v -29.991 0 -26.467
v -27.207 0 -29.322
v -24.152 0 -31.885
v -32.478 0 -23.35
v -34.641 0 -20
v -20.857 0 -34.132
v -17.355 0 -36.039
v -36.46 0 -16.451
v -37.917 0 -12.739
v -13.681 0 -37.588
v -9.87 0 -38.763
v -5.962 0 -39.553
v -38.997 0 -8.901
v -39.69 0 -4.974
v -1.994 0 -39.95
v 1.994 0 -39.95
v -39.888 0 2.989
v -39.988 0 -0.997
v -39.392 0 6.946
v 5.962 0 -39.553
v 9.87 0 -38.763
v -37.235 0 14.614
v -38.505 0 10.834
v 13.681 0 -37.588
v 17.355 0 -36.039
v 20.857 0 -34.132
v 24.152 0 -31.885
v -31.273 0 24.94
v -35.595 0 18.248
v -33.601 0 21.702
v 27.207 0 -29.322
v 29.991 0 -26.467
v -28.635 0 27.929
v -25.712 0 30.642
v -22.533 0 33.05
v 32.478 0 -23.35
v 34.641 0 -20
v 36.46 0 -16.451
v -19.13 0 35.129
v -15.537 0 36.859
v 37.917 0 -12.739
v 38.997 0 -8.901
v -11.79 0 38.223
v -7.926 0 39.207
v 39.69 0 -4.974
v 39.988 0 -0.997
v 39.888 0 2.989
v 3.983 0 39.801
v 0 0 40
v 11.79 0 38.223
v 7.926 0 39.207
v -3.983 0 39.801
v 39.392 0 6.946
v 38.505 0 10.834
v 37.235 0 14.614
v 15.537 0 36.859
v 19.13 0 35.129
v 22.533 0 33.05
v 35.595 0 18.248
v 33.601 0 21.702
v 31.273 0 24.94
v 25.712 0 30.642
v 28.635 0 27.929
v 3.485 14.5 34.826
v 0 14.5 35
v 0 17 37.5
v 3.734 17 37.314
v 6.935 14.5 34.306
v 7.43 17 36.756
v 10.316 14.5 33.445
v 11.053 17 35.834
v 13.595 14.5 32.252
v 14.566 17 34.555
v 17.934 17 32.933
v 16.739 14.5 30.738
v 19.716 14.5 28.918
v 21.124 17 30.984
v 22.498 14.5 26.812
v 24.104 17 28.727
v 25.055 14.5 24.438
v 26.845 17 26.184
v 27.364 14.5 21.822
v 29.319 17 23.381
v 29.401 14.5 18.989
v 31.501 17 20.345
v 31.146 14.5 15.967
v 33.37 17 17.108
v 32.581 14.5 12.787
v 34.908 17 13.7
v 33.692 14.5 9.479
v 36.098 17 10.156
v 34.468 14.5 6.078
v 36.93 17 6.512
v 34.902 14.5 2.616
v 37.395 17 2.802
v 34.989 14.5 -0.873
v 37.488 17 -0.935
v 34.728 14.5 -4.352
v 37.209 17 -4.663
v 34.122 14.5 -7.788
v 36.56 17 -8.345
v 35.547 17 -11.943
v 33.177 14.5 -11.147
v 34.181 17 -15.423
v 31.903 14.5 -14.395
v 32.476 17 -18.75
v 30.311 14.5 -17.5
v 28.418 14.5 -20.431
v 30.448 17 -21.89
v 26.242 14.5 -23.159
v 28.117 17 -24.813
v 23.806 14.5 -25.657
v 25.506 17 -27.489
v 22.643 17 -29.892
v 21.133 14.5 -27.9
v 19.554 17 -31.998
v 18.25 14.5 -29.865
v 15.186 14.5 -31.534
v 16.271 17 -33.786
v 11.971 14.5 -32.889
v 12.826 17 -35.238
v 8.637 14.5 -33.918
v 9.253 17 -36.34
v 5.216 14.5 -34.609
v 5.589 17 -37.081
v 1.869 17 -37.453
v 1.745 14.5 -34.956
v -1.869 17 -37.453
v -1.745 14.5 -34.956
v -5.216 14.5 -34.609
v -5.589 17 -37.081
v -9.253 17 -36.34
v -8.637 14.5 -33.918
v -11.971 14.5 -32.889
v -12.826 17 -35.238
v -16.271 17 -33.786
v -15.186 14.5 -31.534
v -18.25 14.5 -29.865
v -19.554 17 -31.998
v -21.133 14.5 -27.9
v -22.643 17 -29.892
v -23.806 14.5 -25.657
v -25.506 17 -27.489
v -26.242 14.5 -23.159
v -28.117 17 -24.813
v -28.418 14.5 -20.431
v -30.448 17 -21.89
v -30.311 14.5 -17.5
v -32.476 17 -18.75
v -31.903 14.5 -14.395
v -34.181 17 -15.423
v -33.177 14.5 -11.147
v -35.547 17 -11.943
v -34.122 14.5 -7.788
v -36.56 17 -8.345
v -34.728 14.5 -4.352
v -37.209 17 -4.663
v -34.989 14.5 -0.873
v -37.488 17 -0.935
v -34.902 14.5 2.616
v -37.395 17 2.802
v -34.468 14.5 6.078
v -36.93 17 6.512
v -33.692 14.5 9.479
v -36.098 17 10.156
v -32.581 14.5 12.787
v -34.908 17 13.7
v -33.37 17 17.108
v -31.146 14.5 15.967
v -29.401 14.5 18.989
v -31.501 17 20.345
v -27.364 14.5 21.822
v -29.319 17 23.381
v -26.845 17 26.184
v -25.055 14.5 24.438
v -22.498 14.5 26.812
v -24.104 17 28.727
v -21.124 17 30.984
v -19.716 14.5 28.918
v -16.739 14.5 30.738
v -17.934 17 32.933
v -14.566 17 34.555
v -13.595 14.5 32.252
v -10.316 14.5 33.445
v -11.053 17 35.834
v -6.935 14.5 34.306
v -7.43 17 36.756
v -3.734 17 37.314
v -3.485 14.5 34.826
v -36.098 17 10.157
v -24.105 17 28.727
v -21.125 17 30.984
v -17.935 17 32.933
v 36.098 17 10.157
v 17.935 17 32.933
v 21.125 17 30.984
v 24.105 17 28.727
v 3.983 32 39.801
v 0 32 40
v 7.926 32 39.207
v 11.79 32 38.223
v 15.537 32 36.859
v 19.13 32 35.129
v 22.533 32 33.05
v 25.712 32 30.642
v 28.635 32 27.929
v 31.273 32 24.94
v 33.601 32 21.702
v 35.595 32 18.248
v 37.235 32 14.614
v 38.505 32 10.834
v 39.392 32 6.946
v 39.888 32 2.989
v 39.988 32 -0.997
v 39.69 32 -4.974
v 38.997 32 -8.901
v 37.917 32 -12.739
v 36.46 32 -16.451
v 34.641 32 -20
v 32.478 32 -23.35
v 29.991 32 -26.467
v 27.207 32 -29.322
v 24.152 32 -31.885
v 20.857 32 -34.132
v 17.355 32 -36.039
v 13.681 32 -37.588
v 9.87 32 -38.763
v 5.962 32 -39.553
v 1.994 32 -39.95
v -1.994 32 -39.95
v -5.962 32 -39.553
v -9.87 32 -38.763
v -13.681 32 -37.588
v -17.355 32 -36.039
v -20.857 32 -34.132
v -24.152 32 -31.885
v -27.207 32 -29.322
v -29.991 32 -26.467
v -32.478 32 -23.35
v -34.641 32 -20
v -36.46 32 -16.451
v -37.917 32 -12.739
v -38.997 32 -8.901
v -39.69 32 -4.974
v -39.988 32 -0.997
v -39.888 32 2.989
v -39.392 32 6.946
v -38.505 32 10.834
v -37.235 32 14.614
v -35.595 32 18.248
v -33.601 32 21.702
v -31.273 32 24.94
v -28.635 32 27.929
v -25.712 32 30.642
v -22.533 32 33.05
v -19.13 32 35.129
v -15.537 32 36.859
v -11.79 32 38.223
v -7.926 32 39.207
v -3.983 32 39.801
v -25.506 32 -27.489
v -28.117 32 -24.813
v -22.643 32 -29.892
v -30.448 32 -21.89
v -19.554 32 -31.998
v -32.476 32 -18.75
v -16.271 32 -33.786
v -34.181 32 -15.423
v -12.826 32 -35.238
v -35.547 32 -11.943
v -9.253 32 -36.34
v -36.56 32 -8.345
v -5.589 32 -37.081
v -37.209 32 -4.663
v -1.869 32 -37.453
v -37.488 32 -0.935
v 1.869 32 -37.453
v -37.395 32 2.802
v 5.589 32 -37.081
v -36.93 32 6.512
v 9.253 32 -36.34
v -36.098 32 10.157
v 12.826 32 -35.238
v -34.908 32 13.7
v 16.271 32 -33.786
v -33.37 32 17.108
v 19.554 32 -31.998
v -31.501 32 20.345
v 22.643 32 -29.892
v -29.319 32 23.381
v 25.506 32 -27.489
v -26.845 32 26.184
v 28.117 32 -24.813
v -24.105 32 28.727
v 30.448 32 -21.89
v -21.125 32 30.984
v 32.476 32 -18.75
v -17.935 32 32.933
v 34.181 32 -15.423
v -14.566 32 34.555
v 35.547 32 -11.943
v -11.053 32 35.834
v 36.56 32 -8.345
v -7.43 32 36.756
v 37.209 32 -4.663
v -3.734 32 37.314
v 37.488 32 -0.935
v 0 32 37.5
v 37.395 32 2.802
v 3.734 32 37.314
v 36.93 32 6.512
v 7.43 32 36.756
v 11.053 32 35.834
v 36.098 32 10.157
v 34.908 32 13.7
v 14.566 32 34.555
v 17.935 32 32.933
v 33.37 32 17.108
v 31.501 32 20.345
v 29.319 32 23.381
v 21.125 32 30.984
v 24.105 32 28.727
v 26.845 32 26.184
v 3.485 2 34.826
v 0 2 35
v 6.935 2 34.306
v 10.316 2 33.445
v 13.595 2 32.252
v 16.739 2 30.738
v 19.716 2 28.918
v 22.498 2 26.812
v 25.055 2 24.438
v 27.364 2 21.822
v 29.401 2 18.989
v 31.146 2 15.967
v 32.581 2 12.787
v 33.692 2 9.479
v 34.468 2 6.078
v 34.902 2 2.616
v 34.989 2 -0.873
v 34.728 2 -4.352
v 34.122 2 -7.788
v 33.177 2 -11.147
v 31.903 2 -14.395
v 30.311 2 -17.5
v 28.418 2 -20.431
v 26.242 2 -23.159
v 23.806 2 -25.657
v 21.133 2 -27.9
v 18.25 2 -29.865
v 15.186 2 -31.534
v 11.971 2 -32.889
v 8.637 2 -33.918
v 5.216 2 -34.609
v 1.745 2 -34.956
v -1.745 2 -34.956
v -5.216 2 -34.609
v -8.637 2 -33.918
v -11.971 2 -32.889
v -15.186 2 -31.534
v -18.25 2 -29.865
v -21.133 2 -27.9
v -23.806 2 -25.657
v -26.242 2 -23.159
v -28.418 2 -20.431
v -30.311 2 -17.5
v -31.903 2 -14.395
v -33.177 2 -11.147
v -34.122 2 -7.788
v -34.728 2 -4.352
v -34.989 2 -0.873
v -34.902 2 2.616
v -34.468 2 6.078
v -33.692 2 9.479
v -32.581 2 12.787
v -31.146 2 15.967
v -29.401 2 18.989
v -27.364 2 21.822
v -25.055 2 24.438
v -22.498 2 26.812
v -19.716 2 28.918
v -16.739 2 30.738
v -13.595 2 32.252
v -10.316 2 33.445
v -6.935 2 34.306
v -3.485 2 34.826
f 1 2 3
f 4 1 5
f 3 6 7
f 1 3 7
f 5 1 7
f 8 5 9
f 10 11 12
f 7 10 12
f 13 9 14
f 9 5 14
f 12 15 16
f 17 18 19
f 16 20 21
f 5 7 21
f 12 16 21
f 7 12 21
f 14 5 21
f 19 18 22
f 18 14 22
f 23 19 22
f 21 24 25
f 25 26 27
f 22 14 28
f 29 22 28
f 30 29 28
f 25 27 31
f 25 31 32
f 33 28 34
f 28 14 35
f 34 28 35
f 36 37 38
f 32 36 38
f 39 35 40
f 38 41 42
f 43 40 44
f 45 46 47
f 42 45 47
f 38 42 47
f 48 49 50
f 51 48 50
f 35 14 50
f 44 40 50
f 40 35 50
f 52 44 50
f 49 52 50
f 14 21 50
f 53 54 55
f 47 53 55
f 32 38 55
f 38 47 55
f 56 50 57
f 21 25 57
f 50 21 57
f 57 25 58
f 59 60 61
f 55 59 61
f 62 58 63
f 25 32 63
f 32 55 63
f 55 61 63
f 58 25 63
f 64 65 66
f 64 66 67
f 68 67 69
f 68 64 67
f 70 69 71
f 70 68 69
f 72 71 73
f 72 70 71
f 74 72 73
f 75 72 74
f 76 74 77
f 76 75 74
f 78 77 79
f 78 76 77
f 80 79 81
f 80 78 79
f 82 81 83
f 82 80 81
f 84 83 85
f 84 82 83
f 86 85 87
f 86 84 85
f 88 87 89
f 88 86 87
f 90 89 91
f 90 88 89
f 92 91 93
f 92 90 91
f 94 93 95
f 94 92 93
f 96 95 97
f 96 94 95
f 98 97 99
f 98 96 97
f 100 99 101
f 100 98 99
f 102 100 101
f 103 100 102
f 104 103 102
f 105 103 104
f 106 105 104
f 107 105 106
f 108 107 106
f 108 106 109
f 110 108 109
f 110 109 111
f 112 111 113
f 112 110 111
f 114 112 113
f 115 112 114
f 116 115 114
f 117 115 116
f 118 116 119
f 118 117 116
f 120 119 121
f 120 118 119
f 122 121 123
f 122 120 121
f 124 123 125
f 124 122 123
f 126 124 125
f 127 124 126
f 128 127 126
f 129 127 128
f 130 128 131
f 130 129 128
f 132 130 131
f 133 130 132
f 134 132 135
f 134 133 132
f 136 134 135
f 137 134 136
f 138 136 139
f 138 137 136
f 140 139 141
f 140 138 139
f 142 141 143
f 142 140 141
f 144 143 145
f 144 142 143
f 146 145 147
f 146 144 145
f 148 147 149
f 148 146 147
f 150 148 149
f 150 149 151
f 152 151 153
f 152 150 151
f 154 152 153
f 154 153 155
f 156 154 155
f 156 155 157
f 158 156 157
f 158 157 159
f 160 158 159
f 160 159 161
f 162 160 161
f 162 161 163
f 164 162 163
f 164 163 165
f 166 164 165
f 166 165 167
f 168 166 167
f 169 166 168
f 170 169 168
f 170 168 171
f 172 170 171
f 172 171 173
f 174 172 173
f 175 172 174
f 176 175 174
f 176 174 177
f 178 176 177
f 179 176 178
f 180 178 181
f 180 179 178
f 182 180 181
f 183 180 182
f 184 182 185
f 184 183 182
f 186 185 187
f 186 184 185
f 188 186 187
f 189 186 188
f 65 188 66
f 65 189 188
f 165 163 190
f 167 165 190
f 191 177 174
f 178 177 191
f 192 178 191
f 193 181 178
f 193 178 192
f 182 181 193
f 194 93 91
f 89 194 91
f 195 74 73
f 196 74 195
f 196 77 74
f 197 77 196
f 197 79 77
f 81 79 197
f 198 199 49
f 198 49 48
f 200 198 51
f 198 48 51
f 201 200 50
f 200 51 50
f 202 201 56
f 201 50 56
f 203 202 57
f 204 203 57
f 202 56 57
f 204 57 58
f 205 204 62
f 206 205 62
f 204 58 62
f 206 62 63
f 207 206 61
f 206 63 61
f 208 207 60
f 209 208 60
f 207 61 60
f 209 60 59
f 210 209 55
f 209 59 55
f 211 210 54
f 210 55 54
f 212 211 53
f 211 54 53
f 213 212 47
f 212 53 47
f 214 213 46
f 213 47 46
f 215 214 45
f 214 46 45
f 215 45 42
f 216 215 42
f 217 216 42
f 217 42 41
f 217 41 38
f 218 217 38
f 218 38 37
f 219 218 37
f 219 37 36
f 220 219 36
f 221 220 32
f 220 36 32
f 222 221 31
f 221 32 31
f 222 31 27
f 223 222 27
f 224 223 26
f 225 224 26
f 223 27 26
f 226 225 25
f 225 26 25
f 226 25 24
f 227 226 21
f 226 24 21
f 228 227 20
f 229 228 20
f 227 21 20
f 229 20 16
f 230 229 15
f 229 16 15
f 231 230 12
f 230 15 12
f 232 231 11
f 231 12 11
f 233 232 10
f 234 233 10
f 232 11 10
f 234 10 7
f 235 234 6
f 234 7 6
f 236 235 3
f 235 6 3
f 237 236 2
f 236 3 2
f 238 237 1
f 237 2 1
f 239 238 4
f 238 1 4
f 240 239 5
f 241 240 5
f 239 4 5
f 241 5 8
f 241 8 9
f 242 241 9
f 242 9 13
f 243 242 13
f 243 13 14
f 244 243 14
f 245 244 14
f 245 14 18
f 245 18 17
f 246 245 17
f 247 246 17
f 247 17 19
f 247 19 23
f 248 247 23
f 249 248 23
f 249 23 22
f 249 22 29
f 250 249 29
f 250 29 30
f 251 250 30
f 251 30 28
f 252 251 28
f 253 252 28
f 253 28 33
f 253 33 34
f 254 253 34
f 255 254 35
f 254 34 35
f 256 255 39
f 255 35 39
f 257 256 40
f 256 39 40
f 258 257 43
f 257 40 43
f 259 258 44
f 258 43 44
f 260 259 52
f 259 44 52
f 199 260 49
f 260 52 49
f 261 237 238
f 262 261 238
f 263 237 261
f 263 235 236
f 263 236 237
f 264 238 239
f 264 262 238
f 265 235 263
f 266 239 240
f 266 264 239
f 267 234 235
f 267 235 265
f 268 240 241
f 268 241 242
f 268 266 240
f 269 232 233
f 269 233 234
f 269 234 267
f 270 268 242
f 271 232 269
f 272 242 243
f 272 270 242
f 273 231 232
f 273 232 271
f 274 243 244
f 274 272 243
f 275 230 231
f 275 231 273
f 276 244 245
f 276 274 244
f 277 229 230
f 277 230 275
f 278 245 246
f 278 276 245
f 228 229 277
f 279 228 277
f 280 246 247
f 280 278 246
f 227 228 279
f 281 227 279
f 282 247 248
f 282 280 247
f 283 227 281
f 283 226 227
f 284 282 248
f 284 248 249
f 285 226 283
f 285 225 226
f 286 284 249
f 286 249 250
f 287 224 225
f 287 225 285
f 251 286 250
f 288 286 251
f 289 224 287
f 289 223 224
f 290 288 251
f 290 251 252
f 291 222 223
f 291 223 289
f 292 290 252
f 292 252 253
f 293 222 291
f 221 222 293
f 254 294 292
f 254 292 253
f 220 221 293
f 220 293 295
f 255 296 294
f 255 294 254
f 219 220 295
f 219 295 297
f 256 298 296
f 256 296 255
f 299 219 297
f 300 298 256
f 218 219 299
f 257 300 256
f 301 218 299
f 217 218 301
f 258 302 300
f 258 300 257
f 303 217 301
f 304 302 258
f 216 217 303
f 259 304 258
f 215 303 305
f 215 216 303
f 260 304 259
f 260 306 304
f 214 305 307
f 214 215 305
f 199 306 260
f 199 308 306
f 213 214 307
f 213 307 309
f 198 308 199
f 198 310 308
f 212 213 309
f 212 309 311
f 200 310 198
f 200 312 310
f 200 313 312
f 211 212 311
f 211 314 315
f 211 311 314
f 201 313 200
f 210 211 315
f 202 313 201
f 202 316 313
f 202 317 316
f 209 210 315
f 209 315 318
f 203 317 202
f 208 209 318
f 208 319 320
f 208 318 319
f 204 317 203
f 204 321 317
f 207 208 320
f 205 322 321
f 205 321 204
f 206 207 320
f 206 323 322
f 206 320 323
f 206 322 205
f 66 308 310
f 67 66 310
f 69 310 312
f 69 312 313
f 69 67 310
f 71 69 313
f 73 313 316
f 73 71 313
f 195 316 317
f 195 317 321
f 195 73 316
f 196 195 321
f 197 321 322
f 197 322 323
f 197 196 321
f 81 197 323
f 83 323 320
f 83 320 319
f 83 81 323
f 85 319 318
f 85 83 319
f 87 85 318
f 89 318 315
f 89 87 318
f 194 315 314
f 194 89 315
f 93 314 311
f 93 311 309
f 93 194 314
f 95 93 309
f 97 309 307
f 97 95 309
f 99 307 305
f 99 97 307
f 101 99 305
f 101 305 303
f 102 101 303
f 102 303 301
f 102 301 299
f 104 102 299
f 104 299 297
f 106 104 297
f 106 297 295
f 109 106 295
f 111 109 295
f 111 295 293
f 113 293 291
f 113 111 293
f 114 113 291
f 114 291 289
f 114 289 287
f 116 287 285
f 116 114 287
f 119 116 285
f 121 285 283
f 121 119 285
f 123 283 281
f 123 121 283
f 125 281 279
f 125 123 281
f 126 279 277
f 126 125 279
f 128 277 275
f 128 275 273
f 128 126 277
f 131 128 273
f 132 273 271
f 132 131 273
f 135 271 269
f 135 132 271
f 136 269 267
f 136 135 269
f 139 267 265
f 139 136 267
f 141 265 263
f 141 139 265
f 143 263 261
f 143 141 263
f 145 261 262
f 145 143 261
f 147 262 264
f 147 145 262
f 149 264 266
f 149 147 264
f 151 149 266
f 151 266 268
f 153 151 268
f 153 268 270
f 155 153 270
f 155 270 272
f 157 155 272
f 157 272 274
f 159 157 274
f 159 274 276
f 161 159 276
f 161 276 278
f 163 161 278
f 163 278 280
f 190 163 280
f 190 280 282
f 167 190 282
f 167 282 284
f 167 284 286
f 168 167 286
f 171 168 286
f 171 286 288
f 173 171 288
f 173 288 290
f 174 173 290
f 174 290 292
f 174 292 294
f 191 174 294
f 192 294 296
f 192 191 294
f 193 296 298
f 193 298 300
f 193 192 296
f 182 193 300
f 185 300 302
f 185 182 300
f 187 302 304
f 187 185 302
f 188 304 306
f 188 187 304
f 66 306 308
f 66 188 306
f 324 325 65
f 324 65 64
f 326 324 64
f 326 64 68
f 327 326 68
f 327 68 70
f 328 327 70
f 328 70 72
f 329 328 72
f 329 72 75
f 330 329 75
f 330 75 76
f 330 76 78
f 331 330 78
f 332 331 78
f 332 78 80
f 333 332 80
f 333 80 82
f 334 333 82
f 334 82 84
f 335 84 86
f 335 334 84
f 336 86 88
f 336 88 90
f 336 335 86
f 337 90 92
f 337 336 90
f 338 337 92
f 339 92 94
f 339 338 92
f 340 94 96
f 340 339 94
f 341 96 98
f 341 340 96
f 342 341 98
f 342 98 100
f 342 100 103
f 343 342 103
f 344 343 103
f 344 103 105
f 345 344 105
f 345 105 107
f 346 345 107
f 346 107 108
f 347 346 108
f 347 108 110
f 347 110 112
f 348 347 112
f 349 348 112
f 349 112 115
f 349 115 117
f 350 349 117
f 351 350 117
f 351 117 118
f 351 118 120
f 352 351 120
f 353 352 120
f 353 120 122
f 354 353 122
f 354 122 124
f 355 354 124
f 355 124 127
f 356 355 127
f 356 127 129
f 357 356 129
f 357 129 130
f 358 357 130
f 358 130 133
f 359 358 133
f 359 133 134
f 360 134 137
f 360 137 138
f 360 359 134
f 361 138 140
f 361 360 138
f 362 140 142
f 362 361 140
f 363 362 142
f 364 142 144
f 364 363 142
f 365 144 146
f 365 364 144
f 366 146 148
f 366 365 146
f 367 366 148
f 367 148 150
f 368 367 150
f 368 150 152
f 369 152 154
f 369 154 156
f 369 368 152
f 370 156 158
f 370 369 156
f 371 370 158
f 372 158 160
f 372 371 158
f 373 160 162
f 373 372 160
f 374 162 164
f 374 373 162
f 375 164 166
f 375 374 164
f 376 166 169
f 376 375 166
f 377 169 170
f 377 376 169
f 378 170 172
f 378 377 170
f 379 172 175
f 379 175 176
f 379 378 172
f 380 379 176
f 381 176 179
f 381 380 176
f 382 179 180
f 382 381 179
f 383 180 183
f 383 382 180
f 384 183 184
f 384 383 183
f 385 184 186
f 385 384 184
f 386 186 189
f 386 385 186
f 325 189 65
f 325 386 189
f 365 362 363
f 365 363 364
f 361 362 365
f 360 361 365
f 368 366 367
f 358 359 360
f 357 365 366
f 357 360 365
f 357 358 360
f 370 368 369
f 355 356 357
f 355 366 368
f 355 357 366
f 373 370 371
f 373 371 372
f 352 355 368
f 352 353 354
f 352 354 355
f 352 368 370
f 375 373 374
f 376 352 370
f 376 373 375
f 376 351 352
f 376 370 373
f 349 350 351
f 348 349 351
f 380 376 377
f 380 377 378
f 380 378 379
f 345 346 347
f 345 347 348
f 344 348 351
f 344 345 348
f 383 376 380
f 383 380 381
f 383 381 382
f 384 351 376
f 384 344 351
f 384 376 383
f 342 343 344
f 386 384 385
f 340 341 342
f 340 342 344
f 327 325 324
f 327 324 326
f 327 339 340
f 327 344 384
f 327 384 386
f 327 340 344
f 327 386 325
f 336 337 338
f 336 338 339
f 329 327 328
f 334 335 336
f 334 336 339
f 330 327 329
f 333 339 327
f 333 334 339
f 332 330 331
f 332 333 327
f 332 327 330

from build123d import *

# Parameters (mm, degrees)
CROQUIS1_R              = 40
SALIENTE_EXTRUIR1_DEPTH = 2
CROQUIS2_R              = 40
CROQUIS2_R_2            = 35
SALIENTE_EXTRUIR2_DEPTH = 30
CORTAR_EXTRUIR1_START   = -15
CROQUIS3_R              = 37.5
CROQUIS3_R_2            = 35
CORTAR_EXTRUIR1_DEPTH   = 15
CHAFL_N1_SIZE           = 2.5


with BuildPart() as part:
    # Croquis1 → Saliente-Extruir1 (new body)
    with BuildSketch(Plane(origin=(0, 0, 0), x_dir=(1, 0, 0), z_dir=(0, 1, 0))):
        with Locations(Location((0, 0, 0), (0, 0, 270))):
            Circle(CROQUIS1_R)
    extrude(amount=SALIENTE_EXTRUIR1_DEPTH)

    # Croquis2 → Saliente-Extruir2 (add)
    with BuildSketch(Plane(origin=(0, 2, 0), x_dir=(1, 0, 0), z_dir=(0, 1, 0))):
        with Locations(Location((0, 0, 0), (0, 0, 270))):
            Circle(CROQUIS2_R)
        with Locations(Location((0, 0, 0), (0, 0, 270))):
            Circle(CROQUIS2_R_2, mode=Mode.SUBTRACT)
    extrude(amount=SALIENTE_EXTRUIR2_DEPTH)

    # Croquis3 → Cortar-Extruir1 (cut)
    with BuildSketch(Plane(origin=(0, 32, 0), x_dir=(1, 0, 0), z_dir=(0, 1, 0)).offset(CORTAR_EXTRUIR1_START)):
        with Locations(Location((0, 0, 0), (0, 0, 270))):
            Circle(CROQUIS3_R)
        with Locations(Location((0, 0, 0), (0, 0, 270))):
            Circle(CROQUIS3_R_2, mode=Mode.SUBTRACT)
    extrude(amount=CORTAR_EXTRUIR1_DEPTH, mode=Mode.SUBTRACT)

    # Chaflán1
    chafl_n1_edges = [part.edges().sort_by_distance(p)[0] for p in [
        (0, 17, -35),
    ]]
    chamfer(chafl_n1_edges, length=CHAFL_N1_SIZE - 0.0001)  # a hair under: the kernel refuses the full size


solid = part.part
